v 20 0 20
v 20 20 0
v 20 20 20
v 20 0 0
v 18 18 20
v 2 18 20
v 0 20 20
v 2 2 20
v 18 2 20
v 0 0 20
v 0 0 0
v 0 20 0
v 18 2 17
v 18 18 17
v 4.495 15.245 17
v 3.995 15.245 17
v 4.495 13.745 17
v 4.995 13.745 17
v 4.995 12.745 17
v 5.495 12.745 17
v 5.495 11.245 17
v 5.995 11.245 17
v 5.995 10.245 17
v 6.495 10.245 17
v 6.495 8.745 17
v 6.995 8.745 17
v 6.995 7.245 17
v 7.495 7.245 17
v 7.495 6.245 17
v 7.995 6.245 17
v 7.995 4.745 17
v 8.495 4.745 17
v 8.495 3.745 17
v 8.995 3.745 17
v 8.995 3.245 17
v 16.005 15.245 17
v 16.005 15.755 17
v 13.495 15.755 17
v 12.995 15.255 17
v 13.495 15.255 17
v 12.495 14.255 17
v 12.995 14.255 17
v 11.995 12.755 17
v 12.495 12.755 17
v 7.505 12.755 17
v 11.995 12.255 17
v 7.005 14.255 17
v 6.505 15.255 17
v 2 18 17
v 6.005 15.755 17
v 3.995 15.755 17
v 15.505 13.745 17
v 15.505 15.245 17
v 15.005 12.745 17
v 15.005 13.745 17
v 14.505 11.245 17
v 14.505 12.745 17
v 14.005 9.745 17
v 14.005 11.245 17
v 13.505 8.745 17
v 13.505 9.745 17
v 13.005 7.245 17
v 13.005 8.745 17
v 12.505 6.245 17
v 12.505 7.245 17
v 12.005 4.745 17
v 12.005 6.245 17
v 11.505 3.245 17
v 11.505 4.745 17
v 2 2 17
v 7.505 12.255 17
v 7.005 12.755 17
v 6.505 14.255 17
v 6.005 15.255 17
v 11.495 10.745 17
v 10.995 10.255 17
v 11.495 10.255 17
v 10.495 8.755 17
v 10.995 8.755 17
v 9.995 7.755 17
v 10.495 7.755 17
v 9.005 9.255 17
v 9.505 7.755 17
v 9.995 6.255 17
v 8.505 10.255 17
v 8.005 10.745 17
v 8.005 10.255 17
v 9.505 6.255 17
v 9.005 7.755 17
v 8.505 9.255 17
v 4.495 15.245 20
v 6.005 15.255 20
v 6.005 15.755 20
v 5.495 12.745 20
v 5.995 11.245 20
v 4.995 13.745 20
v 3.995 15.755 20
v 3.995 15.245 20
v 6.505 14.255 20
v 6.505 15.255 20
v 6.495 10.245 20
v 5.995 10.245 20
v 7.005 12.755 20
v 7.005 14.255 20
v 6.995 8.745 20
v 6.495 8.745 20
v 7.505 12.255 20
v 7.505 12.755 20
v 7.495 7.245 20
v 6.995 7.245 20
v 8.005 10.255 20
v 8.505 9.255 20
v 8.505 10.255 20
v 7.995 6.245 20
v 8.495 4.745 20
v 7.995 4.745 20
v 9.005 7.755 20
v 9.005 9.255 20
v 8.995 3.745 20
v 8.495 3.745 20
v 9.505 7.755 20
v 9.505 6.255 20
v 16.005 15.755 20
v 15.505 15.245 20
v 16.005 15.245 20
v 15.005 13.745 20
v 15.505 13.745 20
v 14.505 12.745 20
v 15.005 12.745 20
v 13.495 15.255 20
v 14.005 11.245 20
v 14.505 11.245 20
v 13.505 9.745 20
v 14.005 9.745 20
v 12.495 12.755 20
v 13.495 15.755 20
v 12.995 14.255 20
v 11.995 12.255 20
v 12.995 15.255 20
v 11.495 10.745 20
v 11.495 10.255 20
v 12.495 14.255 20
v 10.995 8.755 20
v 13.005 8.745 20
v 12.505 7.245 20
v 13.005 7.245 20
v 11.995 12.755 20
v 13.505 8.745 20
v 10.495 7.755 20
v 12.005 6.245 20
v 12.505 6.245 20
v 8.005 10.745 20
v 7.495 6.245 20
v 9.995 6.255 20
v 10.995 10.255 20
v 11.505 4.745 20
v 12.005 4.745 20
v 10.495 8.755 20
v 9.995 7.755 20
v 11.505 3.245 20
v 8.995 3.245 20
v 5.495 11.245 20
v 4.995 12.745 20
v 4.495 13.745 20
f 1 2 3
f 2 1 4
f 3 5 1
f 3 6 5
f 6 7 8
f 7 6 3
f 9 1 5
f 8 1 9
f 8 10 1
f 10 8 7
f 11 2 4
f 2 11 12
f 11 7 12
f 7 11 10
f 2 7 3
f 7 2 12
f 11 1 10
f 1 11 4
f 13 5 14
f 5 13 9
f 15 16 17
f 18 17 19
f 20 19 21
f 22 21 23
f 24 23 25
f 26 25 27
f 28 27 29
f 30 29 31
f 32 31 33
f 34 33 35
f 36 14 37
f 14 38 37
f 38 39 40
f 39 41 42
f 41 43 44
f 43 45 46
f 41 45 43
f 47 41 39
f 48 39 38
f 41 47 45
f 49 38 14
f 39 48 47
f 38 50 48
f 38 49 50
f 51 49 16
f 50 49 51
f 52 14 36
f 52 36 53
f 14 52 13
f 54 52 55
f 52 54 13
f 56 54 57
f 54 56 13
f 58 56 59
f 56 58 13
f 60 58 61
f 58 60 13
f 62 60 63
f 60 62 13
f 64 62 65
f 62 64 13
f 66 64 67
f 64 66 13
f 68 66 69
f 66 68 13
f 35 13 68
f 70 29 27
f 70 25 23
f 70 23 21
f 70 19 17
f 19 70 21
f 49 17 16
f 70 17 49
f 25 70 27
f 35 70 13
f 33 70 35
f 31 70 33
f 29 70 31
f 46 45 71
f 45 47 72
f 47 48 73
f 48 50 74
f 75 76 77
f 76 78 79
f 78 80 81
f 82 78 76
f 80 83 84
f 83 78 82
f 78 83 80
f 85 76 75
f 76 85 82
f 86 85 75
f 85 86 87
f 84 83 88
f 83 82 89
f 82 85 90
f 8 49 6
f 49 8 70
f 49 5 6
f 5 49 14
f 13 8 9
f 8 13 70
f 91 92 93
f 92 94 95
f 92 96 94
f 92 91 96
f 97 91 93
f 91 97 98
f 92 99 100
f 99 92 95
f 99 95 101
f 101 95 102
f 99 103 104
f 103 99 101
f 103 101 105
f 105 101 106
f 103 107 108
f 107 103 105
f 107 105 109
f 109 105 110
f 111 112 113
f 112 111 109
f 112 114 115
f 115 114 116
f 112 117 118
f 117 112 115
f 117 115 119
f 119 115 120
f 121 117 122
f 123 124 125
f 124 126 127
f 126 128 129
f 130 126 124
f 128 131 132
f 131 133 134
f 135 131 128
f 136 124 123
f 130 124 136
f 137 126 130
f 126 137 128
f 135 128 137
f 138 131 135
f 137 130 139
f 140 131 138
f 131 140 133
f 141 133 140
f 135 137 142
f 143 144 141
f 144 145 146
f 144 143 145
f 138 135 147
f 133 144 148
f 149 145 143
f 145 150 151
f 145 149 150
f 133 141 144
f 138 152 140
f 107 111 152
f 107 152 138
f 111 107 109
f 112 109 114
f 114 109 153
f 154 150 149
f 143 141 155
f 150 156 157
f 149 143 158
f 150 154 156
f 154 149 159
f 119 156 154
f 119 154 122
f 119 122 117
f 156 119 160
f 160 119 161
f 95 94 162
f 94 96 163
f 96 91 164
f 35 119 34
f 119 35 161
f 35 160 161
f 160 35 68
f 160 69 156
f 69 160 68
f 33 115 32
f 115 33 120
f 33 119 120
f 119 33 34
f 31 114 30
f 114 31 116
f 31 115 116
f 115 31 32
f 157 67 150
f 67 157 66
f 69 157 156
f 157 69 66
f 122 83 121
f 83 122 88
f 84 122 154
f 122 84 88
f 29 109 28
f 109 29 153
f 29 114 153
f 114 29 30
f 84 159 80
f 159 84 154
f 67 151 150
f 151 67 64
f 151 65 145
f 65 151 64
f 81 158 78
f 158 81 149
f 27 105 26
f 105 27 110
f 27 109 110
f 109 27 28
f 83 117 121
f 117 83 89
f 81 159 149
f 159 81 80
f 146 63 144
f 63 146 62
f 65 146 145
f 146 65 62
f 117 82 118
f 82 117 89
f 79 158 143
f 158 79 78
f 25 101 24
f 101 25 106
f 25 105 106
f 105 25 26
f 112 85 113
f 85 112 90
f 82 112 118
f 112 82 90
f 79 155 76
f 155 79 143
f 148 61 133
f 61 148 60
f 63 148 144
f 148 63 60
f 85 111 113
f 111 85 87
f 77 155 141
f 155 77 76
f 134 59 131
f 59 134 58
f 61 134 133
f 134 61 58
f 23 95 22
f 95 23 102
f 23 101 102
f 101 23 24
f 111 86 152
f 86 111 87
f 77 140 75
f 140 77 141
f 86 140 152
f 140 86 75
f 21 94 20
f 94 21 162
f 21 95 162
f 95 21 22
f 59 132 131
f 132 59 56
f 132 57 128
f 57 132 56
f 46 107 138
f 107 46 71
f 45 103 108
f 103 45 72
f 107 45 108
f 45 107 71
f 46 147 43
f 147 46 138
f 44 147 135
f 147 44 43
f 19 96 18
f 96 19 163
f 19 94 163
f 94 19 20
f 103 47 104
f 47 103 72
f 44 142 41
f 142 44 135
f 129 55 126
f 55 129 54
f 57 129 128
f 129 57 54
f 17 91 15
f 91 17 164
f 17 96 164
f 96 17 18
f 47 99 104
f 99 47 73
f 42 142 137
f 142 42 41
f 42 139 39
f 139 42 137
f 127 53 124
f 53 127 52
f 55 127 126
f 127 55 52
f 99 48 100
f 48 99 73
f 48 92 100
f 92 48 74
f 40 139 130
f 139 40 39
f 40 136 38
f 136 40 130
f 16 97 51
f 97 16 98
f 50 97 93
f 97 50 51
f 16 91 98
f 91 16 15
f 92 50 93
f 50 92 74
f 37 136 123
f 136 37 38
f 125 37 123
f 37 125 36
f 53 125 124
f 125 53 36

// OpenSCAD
/*
Parametric Alphabet Block 
Tony Buser <tbuser@gmail.com>
http://tonybuser.com
http://creativecommons.org/licenses/by/3.0/

Adapted to use the "32" bit bitmap scad script
*/

use <bitmap_32.scad>

// change to any letter
letter = "A";

union() {
	difference() {
		cube(size = 20);
		translate(v = [2, 2, 17]) {
			cube(size = [16, 16, 5]);
		}
	}

	translate(v = [10, 10, 15]) {
		32bit_char(letter, 0.5, 5);
	}
}
